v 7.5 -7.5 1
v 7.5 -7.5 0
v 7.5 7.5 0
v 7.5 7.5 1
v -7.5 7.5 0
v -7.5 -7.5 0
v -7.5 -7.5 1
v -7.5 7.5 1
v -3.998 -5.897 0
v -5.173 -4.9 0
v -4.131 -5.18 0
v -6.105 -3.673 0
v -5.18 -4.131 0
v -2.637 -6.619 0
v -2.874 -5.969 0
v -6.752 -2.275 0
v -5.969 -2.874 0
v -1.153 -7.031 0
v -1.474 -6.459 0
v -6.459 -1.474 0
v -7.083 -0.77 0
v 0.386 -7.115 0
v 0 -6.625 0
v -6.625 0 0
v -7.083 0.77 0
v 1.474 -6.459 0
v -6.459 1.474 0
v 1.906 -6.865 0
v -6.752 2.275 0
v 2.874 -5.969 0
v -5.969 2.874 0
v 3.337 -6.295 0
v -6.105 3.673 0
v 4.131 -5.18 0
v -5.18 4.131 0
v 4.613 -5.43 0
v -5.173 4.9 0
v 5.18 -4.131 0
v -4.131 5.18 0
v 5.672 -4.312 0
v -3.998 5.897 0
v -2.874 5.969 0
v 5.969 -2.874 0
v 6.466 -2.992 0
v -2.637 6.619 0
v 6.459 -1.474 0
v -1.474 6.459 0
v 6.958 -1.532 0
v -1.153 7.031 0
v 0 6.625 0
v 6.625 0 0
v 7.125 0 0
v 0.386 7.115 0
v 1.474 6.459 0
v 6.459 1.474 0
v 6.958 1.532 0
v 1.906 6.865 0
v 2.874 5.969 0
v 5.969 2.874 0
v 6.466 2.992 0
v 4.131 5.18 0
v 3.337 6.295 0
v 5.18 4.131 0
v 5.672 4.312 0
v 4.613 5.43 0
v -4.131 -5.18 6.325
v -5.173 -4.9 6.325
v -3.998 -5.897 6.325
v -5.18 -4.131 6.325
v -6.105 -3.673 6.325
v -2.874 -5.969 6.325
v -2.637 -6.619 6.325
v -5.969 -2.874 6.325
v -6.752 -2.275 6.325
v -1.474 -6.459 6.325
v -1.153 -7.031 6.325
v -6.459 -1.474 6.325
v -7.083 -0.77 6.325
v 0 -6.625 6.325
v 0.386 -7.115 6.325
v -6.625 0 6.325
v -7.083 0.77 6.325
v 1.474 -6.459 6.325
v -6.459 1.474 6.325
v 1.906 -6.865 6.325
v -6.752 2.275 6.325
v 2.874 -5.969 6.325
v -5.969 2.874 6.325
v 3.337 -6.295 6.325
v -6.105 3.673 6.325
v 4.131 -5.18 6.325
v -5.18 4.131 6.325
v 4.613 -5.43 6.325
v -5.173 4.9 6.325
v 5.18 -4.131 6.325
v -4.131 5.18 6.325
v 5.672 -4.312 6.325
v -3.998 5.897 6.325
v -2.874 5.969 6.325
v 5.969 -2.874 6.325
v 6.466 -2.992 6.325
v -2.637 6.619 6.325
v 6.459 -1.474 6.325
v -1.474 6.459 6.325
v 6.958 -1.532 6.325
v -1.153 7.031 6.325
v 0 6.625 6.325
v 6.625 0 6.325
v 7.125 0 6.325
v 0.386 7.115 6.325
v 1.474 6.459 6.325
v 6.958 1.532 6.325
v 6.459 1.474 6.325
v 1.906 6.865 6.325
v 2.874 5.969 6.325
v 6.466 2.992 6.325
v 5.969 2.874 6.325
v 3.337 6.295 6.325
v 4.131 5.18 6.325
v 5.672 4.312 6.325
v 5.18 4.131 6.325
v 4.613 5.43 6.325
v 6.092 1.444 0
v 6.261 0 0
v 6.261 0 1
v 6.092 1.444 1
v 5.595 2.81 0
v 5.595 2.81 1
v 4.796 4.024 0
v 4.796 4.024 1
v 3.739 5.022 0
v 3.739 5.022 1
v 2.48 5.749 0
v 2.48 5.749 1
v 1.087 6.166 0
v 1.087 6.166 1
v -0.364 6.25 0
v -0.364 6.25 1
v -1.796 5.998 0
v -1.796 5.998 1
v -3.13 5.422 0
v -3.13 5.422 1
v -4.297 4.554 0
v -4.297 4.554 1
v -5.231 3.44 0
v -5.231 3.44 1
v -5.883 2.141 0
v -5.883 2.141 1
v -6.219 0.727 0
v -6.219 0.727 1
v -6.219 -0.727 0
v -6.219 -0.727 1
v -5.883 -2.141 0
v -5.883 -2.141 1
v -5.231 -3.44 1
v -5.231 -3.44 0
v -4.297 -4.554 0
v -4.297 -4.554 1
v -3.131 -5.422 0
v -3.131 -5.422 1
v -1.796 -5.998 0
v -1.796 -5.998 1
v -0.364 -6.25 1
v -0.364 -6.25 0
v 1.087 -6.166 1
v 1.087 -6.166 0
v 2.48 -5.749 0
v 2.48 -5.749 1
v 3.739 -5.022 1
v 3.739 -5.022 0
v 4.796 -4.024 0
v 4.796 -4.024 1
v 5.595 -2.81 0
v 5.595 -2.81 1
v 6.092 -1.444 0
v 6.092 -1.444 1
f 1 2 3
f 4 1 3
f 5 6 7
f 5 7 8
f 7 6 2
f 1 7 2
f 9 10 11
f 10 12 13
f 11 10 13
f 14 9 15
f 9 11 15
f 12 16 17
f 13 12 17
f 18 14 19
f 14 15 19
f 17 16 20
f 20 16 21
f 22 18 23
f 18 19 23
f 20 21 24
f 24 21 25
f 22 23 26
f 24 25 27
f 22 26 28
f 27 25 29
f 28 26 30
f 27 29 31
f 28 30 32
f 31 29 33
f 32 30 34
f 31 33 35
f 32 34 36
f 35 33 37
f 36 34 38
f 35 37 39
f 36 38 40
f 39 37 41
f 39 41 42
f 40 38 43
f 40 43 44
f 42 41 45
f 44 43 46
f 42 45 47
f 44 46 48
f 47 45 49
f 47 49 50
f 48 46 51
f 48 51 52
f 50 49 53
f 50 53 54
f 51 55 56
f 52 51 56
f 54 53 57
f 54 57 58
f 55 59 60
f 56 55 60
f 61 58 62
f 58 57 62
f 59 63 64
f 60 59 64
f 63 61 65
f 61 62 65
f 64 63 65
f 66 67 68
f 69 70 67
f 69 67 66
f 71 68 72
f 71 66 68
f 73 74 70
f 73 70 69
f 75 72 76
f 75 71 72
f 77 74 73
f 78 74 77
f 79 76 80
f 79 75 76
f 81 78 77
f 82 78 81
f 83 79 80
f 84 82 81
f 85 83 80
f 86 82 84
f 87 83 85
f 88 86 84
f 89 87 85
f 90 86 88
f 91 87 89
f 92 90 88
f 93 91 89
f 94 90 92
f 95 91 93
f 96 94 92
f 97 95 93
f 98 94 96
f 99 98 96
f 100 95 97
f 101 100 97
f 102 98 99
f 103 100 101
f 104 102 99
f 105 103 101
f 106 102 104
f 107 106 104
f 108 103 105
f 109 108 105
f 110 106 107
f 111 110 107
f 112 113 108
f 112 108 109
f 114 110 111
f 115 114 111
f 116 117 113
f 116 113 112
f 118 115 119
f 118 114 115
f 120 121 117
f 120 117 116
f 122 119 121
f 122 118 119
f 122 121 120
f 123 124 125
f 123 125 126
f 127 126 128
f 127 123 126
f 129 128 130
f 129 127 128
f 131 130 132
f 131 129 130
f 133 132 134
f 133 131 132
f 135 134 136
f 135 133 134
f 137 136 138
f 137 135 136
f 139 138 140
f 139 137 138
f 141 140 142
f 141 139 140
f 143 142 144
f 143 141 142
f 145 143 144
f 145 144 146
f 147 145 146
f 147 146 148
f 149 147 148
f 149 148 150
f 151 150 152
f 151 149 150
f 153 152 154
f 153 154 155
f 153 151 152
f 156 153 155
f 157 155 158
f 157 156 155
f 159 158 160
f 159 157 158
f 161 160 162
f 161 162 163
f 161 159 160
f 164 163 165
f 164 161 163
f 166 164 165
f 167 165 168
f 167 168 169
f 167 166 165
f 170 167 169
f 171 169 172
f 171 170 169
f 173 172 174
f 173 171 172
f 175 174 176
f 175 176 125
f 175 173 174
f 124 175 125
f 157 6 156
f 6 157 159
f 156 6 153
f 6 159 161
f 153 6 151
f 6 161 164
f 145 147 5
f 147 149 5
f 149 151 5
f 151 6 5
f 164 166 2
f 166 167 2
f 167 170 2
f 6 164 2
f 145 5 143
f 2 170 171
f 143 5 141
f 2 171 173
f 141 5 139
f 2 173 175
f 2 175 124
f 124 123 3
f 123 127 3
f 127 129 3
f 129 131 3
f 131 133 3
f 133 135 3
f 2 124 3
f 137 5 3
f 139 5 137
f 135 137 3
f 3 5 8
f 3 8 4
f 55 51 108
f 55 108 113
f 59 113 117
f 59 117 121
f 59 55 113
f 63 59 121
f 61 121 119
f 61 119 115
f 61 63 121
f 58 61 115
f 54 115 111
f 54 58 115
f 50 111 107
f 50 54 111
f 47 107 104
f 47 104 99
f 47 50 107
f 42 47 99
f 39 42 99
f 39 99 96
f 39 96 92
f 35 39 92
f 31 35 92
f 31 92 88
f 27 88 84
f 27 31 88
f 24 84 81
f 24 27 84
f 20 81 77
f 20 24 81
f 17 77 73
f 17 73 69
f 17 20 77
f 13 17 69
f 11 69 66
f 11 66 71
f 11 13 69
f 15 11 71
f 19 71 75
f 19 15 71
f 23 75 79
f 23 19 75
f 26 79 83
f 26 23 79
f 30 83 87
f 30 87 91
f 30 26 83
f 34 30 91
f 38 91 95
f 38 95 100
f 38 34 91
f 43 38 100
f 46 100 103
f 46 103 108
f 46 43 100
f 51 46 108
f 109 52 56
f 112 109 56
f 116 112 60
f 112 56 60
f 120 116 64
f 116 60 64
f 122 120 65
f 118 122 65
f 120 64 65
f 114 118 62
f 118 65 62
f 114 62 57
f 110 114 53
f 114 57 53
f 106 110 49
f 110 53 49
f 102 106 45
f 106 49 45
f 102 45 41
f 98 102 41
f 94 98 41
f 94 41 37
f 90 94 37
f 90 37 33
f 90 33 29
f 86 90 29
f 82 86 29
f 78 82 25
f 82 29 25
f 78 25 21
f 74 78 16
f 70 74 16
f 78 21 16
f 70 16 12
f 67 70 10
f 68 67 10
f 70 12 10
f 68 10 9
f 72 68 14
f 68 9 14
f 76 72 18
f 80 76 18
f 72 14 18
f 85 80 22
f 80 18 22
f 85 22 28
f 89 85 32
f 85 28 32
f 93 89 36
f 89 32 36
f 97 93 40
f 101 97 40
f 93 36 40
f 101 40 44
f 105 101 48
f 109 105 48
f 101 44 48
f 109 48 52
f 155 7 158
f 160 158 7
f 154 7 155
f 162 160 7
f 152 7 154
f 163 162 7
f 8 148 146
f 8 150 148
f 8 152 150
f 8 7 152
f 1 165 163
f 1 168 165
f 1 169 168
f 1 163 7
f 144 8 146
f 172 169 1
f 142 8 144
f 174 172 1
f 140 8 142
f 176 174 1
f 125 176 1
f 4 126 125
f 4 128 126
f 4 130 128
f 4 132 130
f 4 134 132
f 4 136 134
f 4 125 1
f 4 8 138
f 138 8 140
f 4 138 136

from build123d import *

# Parameters (mm, degrees)
F0_W     = 15
F0_H     = 15
F0_R     = 6.261
F1_DEPTH = 1
F2_R     = 7.125
F2_R_2   = 6.625
F3_DEPTH = 6.325


with BuildPart() as f1:
    # F0 (on Top) → F1 (new body)
    with BuildSketch(Plane.XY):
        Rectangle(F0_W, F0_H)
        Circle(F0_R, mode=Mode.SUBTRACT)
    extrude(amount=F1_DEPTH)


with BuildPart() as f3:
    # F2 (on Top) → F3 (new body)
    with BuildSketch(Plane.XY):
        Circle(F2_R)
        Circle(F2_R_2, mode=Mode.SUBTRACT)
    extrude(amount=F3_DEPTH)


solid = Compound([f1.part, f3.part])
